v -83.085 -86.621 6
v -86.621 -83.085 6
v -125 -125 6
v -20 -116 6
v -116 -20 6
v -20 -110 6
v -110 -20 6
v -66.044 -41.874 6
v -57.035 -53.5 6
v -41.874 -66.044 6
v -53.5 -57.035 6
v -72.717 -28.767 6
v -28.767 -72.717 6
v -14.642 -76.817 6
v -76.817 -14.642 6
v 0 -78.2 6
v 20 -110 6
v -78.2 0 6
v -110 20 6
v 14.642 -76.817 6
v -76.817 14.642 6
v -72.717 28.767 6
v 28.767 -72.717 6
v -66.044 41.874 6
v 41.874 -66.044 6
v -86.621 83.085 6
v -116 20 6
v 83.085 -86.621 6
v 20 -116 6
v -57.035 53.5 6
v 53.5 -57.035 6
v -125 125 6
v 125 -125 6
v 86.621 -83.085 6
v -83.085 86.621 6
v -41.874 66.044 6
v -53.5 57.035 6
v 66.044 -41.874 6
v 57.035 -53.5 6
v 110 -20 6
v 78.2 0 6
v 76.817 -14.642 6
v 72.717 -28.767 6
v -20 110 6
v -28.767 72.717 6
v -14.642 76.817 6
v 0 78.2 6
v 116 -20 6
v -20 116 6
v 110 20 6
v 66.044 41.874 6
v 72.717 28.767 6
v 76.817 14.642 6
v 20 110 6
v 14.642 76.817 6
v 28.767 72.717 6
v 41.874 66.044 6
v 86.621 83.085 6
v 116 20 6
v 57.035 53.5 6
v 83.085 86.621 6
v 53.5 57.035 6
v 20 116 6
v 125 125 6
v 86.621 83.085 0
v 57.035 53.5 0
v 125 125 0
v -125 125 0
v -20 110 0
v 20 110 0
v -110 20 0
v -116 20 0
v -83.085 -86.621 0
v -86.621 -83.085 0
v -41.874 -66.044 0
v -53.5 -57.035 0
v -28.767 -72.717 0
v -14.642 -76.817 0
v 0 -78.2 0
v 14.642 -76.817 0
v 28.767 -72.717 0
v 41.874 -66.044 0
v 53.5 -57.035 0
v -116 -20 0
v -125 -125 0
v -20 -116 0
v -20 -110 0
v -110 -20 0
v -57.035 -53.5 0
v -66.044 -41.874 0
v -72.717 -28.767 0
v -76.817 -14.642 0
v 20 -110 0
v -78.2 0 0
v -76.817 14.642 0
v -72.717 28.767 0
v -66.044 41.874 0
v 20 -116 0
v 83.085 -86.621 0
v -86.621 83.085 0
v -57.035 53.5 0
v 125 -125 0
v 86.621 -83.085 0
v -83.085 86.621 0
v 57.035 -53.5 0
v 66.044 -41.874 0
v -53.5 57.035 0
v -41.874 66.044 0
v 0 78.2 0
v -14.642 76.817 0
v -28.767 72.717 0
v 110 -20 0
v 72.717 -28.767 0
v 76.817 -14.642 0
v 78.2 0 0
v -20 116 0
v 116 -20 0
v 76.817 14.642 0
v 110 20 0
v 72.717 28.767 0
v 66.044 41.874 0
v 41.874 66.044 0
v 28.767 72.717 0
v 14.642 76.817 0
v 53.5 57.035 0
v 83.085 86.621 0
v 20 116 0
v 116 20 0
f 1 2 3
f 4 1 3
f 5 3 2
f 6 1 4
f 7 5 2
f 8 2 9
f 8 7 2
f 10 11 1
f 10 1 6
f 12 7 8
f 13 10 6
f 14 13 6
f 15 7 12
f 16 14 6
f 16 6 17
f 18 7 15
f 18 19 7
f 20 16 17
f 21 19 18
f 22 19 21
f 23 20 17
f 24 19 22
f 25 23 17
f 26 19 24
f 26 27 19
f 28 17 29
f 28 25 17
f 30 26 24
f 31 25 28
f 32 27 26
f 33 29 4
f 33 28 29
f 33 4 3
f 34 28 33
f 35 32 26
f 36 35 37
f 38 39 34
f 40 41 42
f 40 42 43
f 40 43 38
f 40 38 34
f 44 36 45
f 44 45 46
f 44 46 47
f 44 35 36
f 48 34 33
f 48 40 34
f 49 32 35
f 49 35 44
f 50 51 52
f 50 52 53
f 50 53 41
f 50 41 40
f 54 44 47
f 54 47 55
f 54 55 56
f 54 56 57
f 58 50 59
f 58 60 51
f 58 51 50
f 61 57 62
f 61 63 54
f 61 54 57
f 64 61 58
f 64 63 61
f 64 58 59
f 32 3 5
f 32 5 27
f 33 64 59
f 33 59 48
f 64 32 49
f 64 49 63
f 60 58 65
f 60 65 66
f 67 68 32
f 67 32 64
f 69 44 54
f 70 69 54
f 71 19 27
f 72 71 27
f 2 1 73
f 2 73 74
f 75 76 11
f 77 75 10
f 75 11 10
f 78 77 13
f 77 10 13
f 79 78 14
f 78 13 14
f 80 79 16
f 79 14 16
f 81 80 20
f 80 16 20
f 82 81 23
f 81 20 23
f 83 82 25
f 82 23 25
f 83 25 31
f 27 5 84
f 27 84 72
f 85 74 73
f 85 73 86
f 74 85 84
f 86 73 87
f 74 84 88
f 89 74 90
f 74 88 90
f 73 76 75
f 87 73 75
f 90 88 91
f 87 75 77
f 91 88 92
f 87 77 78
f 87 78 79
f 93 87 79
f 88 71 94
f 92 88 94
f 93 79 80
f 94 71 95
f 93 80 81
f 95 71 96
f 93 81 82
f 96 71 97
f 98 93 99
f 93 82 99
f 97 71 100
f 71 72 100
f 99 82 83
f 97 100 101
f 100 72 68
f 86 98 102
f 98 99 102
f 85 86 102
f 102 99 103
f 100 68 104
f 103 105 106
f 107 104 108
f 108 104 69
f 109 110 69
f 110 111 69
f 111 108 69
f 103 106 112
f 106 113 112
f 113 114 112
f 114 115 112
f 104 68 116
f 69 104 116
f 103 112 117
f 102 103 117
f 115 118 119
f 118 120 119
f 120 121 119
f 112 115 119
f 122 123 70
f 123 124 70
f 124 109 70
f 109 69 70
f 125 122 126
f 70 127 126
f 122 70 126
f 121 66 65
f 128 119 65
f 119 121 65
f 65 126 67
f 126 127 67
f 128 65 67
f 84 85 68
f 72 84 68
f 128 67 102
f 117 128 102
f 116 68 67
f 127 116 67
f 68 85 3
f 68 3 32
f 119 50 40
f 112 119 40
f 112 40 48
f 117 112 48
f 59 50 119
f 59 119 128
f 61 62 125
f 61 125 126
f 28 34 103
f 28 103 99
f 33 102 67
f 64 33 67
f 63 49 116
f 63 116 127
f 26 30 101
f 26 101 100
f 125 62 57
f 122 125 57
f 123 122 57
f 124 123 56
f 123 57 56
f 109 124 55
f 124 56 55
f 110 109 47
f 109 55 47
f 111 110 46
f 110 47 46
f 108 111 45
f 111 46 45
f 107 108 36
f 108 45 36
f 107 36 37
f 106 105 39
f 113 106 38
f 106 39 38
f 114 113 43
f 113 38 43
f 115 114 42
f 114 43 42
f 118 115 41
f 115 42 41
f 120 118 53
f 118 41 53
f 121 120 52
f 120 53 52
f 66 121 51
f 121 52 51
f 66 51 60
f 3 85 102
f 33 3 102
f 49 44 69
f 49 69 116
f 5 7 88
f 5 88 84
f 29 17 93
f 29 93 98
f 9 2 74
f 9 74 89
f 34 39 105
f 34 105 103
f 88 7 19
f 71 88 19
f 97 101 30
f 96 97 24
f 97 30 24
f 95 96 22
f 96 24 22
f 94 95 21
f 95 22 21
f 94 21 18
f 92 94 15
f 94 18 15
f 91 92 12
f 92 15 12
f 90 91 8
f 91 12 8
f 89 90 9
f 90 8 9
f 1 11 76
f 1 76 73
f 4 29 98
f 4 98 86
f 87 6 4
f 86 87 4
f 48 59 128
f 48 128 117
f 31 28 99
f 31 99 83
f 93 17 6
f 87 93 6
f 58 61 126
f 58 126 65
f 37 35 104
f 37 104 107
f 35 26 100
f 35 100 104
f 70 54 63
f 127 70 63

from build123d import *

# Parameters (mm, degrees)
SKETCH1_W           = 250
SKETCH1_H           = 250
BOSS_EXTRUDE1_DEPTH = 6
SKETCH2_R           = 78.2
CUT_EXTRUDE1_DEPTH  = 177.878489365
CUT_EXTRUDE2_DEPTH  = 177.878489365
CIRPATTERN1_COUNT   = 4
SKETCH4_W           = 40
SKETCH4_H           = 6
CUT_EXTRUDE3_DEPTH  = 177.878489365
CIRPATTERN2_COUNT   = 4


with BuildPart() as part:
    # Sketch1 → Boss-Extrude1 (new body)
    with BuildSketch(Plane.XY):
        Rectangle(SKETCH1_W, SKETCH1_H)
    extrude(amount=BOSS_EXTRUDE1_DEPTH)

    # Sketch2 → Cut-Extrude1 (cut, through all)
    with BuildSketch(Plane.XY.offset(6)):
        Circle(SKETCH2_R)
    extrude(amount=-CUT_EXTRUDE1_DEPTH, mode=Mode.SUBTRACT)

    # Sketch3 → Cut-Extrude2 (cut, through all)
    with BuildSketch(Plane.XY.offset(6)):
        with BuildLine():
            Line((-57.035252874, 53.499718968), (-86.620580695, 83.085046789))
            Line((-86.620580695, 83.085046789), (-83.085046789, 86.620580695))
            Line((-83.085046789, 86.620580695), (-53.499718968, 57.035252874))
            ThreePointArc((-53.499718968, 57.035252874), (-55.295750289, 55.295750289), (-57.035252874, 53.499718968))
        make_face()
    cut_extrude2 = extrude(amount=-CUT_EXTRUDE2_DEPTH, mode=Mode.SUBTRACT)

    # CirPattern1: Cut-Extrude2 ×4 about axis
    cirpattern1_axis = Axis((0, 0, -0.3), (0, 0, 1))
    for i in range(1, CIRPATTERN1_COUNT):
        add(cut_extrude2.rotate(cirpattern1_axis, i * 360 / CIRPATTERN1_COUNT), mode=Mode.SUBTRACT)

    # Sketch4 → Cut-Extrude3 (cut, through all)
    with BuildSketch(Plane.XY.offset(6)):
        with Locations((0, 113)):
            Rectangle(SKETCH4_W, SKETCH4_H)
    cut_extrude3 = extrude(amount=-CUT_EXTRUDE3_DEPTH, mode=Mode.SUBTRACT)

    # CirPattern2: Cut-Extrude3 ×4 about axis
    cirpattern2_axis = Axis((0, 0, -0.3), (0, 0, 1))
    for i in range(1, CIRPATTERN2_COUNT):
        add(cut_extrude3.rotate(cirpattern2_axis, i * 360 / CIRPATTERN2_COUNT), mode=Mode.SUBTRACT)


solid = part.part
